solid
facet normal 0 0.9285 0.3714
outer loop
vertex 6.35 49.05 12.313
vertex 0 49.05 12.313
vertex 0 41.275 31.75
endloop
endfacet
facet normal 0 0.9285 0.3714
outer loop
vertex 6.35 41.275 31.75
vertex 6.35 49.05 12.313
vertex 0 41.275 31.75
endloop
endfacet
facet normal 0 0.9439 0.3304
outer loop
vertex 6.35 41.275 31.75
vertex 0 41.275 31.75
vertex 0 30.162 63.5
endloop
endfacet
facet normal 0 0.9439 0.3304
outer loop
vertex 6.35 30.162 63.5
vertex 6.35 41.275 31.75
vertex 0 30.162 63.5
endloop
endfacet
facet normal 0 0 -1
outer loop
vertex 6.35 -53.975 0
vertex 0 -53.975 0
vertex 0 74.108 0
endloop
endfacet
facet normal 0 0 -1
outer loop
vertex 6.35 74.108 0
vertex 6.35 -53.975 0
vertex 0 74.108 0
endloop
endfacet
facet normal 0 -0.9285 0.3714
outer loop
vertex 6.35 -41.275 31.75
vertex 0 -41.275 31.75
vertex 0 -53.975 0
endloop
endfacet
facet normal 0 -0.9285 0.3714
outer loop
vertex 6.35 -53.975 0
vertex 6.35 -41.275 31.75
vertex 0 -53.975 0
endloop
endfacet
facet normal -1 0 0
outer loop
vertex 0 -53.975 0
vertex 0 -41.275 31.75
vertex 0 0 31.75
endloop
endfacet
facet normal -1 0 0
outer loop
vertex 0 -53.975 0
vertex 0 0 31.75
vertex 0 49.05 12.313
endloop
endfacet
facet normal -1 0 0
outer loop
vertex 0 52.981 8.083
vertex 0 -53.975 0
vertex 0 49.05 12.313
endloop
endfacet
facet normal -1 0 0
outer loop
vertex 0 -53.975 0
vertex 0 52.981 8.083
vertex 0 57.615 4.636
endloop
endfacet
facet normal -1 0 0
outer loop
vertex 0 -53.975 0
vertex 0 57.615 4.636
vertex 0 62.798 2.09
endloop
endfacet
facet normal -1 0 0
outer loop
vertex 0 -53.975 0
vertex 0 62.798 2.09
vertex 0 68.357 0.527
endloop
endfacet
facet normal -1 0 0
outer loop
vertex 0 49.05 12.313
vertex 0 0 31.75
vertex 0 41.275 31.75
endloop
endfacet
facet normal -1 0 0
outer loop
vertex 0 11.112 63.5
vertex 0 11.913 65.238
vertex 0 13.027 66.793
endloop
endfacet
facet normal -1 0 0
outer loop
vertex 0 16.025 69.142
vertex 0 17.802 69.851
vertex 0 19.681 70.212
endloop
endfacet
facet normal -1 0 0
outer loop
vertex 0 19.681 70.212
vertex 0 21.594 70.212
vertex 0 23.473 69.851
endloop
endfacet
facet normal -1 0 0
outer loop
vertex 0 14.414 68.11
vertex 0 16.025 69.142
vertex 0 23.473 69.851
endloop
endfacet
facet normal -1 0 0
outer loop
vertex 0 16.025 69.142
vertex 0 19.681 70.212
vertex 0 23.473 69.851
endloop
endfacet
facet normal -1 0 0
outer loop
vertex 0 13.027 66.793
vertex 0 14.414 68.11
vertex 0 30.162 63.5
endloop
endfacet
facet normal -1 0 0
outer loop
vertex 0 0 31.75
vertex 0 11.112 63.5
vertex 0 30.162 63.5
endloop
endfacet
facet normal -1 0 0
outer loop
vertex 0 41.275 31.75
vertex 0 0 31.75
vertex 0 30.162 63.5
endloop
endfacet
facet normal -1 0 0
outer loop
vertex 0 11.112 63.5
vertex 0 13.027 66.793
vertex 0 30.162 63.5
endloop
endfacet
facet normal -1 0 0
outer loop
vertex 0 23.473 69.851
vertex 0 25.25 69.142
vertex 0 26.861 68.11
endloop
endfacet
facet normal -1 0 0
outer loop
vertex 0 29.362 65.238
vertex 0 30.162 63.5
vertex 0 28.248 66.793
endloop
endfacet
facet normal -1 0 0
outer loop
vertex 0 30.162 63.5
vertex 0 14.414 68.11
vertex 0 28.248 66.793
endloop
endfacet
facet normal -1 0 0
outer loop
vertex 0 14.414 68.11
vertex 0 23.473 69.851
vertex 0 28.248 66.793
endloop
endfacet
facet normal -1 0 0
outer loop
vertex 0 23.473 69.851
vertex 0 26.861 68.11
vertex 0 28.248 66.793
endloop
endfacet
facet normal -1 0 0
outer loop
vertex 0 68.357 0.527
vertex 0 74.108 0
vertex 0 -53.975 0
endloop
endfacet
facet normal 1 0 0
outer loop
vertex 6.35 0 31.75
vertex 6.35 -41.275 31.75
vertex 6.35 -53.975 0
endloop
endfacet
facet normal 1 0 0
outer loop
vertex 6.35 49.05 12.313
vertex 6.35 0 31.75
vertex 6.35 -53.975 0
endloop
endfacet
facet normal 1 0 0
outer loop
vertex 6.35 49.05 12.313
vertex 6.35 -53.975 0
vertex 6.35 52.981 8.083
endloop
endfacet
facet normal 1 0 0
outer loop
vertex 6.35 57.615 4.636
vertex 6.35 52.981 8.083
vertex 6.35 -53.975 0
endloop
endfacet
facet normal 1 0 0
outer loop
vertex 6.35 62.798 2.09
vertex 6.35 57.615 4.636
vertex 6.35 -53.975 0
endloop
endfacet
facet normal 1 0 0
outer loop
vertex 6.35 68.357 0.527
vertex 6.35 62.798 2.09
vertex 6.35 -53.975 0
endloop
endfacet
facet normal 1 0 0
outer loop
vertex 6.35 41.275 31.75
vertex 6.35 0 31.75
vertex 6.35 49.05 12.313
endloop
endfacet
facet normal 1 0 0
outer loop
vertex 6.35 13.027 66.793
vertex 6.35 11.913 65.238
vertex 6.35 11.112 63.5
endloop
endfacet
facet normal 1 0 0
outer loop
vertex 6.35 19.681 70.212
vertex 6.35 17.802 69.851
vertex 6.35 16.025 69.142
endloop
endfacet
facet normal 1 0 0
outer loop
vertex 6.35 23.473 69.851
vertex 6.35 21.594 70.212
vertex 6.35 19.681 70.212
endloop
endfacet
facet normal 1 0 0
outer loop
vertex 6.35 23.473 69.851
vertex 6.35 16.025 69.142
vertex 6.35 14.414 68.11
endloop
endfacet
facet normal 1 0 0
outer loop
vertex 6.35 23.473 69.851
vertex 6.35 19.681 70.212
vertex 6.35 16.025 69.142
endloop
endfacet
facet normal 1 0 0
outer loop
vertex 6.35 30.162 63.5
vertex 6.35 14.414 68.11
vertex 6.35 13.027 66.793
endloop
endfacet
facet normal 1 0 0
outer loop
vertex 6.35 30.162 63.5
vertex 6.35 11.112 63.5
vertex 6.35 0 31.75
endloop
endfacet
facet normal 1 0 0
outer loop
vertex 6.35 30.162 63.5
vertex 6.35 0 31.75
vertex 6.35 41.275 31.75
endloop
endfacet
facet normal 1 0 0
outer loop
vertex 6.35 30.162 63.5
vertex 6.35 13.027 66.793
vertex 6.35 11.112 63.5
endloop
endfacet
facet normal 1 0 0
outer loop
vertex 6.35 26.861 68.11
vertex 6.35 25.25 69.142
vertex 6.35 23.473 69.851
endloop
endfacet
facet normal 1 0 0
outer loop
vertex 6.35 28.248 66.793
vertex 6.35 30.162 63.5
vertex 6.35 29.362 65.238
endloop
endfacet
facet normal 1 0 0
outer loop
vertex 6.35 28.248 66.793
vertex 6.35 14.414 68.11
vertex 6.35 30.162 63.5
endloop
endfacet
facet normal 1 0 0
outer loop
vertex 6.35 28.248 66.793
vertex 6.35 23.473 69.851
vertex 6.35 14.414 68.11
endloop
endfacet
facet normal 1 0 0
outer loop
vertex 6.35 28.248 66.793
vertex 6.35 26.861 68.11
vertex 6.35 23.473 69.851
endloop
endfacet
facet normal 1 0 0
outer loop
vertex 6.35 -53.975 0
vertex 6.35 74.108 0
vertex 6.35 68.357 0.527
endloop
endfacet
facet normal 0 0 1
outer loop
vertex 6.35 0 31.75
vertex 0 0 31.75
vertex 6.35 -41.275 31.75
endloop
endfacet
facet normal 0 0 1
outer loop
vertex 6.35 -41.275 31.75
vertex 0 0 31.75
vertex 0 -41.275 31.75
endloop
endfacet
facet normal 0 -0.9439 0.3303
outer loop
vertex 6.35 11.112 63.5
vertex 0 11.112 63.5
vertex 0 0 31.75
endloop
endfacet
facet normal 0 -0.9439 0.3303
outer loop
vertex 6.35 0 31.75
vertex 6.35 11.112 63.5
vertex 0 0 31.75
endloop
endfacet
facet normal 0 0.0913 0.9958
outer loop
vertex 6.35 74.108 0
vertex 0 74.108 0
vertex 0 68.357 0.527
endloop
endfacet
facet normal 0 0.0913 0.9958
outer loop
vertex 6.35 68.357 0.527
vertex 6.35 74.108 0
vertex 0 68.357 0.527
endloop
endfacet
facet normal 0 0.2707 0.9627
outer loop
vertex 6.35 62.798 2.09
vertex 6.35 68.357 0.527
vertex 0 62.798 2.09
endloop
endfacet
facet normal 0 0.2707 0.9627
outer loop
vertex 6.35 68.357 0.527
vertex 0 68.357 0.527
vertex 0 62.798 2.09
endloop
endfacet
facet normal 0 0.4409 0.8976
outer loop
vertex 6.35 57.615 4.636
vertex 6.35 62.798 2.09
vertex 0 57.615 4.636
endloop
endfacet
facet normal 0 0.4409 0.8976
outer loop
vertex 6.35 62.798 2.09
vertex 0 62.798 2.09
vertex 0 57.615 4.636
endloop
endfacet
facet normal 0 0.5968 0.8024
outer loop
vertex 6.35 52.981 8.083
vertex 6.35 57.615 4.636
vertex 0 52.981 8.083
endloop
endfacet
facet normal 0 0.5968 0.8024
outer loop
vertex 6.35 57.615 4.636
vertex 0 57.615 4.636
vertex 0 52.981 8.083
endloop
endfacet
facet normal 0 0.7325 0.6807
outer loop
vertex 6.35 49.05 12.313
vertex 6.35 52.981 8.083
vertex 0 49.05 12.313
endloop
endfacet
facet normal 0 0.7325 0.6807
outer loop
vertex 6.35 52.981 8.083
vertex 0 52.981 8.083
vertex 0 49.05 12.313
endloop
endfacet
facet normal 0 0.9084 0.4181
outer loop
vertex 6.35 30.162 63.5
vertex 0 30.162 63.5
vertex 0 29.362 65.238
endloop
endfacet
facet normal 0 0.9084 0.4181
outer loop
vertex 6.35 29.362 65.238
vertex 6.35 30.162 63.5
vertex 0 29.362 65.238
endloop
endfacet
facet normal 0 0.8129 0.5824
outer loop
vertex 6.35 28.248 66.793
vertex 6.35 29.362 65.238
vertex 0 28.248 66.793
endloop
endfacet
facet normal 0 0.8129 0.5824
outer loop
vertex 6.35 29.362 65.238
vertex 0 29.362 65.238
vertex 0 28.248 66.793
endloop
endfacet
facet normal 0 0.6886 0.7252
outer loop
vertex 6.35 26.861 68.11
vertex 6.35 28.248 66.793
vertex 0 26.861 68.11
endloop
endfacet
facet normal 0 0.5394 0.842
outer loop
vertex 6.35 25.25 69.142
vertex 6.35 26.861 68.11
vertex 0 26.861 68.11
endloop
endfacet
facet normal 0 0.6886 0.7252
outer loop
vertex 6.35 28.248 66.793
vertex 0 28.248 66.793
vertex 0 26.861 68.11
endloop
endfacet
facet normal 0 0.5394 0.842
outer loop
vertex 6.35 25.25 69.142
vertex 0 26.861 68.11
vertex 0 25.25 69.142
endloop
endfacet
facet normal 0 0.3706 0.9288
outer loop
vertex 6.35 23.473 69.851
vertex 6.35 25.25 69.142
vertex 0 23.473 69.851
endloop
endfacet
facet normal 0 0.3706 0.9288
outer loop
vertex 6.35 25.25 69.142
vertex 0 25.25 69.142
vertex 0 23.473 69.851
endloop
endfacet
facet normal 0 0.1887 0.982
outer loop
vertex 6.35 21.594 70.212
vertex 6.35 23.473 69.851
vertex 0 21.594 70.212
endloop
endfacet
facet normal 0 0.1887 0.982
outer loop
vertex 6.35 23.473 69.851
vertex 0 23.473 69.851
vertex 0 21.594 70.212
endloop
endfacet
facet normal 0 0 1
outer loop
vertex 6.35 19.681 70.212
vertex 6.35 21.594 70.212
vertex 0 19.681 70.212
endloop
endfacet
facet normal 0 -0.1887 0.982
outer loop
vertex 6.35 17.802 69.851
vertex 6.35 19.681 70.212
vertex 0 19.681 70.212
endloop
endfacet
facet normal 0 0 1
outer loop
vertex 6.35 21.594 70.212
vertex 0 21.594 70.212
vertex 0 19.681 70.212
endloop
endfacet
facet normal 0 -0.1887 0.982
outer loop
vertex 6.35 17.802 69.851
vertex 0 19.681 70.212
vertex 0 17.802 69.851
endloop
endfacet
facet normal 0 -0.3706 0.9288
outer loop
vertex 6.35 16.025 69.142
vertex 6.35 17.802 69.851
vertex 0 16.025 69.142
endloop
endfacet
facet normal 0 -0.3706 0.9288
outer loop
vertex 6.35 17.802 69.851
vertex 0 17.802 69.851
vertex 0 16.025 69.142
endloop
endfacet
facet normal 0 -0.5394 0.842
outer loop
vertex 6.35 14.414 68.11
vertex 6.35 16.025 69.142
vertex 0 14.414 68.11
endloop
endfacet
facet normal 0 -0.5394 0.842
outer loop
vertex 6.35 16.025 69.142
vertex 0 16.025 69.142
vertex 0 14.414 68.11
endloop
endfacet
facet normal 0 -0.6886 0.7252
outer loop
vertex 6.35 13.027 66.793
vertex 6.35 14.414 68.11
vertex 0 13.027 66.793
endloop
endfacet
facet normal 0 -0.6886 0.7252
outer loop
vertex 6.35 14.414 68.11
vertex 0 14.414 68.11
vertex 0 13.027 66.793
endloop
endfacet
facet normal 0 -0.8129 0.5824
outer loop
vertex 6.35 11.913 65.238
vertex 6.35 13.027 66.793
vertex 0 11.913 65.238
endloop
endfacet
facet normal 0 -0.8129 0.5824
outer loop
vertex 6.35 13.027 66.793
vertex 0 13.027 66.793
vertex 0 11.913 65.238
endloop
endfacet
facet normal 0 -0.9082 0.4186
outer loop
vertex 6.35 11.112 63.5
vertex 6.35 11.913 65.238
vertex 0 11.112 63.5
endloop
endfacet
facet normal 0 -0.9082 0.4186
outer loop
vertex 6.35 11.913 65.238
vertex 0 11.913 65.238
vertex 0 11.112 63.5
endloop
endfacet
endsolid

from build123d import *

# Parameters (mm, degrees)
F1_DEPTH = 6.35


with BuildPart() as f1:
    # F0 (on Right) → F1 (new body)
    with BuildSketch(Plane.YZ):
        with BuildLine():
            Line((-53.975, 0), (0, 0))
            Line((0, 0), (53.975, 0))
            Line((53.975, 0), (74.108012, 0))
            ThreePointArc((74.108012, 0), (60.147935, 3.244599), (49.049701, 12.313247))
            Line((49.049701, 12.313247), (41.275, 31.75))
            Line((41.275, 31.75), (30.1625, 63.5))
            ThreePointArc((30.1625, 63.5), (20.6375, 70.257807), (11.1125, 63.5))
            Line((11.1125, 63.5), (0, 31.75))
            Line((0, 31.75), (-41.275, 31.75))
            Line((-41.275, 31.75), (-53.975, 0))
        make_face()
    extrude(amount=F1_DEPTH)


solid = f1.part
